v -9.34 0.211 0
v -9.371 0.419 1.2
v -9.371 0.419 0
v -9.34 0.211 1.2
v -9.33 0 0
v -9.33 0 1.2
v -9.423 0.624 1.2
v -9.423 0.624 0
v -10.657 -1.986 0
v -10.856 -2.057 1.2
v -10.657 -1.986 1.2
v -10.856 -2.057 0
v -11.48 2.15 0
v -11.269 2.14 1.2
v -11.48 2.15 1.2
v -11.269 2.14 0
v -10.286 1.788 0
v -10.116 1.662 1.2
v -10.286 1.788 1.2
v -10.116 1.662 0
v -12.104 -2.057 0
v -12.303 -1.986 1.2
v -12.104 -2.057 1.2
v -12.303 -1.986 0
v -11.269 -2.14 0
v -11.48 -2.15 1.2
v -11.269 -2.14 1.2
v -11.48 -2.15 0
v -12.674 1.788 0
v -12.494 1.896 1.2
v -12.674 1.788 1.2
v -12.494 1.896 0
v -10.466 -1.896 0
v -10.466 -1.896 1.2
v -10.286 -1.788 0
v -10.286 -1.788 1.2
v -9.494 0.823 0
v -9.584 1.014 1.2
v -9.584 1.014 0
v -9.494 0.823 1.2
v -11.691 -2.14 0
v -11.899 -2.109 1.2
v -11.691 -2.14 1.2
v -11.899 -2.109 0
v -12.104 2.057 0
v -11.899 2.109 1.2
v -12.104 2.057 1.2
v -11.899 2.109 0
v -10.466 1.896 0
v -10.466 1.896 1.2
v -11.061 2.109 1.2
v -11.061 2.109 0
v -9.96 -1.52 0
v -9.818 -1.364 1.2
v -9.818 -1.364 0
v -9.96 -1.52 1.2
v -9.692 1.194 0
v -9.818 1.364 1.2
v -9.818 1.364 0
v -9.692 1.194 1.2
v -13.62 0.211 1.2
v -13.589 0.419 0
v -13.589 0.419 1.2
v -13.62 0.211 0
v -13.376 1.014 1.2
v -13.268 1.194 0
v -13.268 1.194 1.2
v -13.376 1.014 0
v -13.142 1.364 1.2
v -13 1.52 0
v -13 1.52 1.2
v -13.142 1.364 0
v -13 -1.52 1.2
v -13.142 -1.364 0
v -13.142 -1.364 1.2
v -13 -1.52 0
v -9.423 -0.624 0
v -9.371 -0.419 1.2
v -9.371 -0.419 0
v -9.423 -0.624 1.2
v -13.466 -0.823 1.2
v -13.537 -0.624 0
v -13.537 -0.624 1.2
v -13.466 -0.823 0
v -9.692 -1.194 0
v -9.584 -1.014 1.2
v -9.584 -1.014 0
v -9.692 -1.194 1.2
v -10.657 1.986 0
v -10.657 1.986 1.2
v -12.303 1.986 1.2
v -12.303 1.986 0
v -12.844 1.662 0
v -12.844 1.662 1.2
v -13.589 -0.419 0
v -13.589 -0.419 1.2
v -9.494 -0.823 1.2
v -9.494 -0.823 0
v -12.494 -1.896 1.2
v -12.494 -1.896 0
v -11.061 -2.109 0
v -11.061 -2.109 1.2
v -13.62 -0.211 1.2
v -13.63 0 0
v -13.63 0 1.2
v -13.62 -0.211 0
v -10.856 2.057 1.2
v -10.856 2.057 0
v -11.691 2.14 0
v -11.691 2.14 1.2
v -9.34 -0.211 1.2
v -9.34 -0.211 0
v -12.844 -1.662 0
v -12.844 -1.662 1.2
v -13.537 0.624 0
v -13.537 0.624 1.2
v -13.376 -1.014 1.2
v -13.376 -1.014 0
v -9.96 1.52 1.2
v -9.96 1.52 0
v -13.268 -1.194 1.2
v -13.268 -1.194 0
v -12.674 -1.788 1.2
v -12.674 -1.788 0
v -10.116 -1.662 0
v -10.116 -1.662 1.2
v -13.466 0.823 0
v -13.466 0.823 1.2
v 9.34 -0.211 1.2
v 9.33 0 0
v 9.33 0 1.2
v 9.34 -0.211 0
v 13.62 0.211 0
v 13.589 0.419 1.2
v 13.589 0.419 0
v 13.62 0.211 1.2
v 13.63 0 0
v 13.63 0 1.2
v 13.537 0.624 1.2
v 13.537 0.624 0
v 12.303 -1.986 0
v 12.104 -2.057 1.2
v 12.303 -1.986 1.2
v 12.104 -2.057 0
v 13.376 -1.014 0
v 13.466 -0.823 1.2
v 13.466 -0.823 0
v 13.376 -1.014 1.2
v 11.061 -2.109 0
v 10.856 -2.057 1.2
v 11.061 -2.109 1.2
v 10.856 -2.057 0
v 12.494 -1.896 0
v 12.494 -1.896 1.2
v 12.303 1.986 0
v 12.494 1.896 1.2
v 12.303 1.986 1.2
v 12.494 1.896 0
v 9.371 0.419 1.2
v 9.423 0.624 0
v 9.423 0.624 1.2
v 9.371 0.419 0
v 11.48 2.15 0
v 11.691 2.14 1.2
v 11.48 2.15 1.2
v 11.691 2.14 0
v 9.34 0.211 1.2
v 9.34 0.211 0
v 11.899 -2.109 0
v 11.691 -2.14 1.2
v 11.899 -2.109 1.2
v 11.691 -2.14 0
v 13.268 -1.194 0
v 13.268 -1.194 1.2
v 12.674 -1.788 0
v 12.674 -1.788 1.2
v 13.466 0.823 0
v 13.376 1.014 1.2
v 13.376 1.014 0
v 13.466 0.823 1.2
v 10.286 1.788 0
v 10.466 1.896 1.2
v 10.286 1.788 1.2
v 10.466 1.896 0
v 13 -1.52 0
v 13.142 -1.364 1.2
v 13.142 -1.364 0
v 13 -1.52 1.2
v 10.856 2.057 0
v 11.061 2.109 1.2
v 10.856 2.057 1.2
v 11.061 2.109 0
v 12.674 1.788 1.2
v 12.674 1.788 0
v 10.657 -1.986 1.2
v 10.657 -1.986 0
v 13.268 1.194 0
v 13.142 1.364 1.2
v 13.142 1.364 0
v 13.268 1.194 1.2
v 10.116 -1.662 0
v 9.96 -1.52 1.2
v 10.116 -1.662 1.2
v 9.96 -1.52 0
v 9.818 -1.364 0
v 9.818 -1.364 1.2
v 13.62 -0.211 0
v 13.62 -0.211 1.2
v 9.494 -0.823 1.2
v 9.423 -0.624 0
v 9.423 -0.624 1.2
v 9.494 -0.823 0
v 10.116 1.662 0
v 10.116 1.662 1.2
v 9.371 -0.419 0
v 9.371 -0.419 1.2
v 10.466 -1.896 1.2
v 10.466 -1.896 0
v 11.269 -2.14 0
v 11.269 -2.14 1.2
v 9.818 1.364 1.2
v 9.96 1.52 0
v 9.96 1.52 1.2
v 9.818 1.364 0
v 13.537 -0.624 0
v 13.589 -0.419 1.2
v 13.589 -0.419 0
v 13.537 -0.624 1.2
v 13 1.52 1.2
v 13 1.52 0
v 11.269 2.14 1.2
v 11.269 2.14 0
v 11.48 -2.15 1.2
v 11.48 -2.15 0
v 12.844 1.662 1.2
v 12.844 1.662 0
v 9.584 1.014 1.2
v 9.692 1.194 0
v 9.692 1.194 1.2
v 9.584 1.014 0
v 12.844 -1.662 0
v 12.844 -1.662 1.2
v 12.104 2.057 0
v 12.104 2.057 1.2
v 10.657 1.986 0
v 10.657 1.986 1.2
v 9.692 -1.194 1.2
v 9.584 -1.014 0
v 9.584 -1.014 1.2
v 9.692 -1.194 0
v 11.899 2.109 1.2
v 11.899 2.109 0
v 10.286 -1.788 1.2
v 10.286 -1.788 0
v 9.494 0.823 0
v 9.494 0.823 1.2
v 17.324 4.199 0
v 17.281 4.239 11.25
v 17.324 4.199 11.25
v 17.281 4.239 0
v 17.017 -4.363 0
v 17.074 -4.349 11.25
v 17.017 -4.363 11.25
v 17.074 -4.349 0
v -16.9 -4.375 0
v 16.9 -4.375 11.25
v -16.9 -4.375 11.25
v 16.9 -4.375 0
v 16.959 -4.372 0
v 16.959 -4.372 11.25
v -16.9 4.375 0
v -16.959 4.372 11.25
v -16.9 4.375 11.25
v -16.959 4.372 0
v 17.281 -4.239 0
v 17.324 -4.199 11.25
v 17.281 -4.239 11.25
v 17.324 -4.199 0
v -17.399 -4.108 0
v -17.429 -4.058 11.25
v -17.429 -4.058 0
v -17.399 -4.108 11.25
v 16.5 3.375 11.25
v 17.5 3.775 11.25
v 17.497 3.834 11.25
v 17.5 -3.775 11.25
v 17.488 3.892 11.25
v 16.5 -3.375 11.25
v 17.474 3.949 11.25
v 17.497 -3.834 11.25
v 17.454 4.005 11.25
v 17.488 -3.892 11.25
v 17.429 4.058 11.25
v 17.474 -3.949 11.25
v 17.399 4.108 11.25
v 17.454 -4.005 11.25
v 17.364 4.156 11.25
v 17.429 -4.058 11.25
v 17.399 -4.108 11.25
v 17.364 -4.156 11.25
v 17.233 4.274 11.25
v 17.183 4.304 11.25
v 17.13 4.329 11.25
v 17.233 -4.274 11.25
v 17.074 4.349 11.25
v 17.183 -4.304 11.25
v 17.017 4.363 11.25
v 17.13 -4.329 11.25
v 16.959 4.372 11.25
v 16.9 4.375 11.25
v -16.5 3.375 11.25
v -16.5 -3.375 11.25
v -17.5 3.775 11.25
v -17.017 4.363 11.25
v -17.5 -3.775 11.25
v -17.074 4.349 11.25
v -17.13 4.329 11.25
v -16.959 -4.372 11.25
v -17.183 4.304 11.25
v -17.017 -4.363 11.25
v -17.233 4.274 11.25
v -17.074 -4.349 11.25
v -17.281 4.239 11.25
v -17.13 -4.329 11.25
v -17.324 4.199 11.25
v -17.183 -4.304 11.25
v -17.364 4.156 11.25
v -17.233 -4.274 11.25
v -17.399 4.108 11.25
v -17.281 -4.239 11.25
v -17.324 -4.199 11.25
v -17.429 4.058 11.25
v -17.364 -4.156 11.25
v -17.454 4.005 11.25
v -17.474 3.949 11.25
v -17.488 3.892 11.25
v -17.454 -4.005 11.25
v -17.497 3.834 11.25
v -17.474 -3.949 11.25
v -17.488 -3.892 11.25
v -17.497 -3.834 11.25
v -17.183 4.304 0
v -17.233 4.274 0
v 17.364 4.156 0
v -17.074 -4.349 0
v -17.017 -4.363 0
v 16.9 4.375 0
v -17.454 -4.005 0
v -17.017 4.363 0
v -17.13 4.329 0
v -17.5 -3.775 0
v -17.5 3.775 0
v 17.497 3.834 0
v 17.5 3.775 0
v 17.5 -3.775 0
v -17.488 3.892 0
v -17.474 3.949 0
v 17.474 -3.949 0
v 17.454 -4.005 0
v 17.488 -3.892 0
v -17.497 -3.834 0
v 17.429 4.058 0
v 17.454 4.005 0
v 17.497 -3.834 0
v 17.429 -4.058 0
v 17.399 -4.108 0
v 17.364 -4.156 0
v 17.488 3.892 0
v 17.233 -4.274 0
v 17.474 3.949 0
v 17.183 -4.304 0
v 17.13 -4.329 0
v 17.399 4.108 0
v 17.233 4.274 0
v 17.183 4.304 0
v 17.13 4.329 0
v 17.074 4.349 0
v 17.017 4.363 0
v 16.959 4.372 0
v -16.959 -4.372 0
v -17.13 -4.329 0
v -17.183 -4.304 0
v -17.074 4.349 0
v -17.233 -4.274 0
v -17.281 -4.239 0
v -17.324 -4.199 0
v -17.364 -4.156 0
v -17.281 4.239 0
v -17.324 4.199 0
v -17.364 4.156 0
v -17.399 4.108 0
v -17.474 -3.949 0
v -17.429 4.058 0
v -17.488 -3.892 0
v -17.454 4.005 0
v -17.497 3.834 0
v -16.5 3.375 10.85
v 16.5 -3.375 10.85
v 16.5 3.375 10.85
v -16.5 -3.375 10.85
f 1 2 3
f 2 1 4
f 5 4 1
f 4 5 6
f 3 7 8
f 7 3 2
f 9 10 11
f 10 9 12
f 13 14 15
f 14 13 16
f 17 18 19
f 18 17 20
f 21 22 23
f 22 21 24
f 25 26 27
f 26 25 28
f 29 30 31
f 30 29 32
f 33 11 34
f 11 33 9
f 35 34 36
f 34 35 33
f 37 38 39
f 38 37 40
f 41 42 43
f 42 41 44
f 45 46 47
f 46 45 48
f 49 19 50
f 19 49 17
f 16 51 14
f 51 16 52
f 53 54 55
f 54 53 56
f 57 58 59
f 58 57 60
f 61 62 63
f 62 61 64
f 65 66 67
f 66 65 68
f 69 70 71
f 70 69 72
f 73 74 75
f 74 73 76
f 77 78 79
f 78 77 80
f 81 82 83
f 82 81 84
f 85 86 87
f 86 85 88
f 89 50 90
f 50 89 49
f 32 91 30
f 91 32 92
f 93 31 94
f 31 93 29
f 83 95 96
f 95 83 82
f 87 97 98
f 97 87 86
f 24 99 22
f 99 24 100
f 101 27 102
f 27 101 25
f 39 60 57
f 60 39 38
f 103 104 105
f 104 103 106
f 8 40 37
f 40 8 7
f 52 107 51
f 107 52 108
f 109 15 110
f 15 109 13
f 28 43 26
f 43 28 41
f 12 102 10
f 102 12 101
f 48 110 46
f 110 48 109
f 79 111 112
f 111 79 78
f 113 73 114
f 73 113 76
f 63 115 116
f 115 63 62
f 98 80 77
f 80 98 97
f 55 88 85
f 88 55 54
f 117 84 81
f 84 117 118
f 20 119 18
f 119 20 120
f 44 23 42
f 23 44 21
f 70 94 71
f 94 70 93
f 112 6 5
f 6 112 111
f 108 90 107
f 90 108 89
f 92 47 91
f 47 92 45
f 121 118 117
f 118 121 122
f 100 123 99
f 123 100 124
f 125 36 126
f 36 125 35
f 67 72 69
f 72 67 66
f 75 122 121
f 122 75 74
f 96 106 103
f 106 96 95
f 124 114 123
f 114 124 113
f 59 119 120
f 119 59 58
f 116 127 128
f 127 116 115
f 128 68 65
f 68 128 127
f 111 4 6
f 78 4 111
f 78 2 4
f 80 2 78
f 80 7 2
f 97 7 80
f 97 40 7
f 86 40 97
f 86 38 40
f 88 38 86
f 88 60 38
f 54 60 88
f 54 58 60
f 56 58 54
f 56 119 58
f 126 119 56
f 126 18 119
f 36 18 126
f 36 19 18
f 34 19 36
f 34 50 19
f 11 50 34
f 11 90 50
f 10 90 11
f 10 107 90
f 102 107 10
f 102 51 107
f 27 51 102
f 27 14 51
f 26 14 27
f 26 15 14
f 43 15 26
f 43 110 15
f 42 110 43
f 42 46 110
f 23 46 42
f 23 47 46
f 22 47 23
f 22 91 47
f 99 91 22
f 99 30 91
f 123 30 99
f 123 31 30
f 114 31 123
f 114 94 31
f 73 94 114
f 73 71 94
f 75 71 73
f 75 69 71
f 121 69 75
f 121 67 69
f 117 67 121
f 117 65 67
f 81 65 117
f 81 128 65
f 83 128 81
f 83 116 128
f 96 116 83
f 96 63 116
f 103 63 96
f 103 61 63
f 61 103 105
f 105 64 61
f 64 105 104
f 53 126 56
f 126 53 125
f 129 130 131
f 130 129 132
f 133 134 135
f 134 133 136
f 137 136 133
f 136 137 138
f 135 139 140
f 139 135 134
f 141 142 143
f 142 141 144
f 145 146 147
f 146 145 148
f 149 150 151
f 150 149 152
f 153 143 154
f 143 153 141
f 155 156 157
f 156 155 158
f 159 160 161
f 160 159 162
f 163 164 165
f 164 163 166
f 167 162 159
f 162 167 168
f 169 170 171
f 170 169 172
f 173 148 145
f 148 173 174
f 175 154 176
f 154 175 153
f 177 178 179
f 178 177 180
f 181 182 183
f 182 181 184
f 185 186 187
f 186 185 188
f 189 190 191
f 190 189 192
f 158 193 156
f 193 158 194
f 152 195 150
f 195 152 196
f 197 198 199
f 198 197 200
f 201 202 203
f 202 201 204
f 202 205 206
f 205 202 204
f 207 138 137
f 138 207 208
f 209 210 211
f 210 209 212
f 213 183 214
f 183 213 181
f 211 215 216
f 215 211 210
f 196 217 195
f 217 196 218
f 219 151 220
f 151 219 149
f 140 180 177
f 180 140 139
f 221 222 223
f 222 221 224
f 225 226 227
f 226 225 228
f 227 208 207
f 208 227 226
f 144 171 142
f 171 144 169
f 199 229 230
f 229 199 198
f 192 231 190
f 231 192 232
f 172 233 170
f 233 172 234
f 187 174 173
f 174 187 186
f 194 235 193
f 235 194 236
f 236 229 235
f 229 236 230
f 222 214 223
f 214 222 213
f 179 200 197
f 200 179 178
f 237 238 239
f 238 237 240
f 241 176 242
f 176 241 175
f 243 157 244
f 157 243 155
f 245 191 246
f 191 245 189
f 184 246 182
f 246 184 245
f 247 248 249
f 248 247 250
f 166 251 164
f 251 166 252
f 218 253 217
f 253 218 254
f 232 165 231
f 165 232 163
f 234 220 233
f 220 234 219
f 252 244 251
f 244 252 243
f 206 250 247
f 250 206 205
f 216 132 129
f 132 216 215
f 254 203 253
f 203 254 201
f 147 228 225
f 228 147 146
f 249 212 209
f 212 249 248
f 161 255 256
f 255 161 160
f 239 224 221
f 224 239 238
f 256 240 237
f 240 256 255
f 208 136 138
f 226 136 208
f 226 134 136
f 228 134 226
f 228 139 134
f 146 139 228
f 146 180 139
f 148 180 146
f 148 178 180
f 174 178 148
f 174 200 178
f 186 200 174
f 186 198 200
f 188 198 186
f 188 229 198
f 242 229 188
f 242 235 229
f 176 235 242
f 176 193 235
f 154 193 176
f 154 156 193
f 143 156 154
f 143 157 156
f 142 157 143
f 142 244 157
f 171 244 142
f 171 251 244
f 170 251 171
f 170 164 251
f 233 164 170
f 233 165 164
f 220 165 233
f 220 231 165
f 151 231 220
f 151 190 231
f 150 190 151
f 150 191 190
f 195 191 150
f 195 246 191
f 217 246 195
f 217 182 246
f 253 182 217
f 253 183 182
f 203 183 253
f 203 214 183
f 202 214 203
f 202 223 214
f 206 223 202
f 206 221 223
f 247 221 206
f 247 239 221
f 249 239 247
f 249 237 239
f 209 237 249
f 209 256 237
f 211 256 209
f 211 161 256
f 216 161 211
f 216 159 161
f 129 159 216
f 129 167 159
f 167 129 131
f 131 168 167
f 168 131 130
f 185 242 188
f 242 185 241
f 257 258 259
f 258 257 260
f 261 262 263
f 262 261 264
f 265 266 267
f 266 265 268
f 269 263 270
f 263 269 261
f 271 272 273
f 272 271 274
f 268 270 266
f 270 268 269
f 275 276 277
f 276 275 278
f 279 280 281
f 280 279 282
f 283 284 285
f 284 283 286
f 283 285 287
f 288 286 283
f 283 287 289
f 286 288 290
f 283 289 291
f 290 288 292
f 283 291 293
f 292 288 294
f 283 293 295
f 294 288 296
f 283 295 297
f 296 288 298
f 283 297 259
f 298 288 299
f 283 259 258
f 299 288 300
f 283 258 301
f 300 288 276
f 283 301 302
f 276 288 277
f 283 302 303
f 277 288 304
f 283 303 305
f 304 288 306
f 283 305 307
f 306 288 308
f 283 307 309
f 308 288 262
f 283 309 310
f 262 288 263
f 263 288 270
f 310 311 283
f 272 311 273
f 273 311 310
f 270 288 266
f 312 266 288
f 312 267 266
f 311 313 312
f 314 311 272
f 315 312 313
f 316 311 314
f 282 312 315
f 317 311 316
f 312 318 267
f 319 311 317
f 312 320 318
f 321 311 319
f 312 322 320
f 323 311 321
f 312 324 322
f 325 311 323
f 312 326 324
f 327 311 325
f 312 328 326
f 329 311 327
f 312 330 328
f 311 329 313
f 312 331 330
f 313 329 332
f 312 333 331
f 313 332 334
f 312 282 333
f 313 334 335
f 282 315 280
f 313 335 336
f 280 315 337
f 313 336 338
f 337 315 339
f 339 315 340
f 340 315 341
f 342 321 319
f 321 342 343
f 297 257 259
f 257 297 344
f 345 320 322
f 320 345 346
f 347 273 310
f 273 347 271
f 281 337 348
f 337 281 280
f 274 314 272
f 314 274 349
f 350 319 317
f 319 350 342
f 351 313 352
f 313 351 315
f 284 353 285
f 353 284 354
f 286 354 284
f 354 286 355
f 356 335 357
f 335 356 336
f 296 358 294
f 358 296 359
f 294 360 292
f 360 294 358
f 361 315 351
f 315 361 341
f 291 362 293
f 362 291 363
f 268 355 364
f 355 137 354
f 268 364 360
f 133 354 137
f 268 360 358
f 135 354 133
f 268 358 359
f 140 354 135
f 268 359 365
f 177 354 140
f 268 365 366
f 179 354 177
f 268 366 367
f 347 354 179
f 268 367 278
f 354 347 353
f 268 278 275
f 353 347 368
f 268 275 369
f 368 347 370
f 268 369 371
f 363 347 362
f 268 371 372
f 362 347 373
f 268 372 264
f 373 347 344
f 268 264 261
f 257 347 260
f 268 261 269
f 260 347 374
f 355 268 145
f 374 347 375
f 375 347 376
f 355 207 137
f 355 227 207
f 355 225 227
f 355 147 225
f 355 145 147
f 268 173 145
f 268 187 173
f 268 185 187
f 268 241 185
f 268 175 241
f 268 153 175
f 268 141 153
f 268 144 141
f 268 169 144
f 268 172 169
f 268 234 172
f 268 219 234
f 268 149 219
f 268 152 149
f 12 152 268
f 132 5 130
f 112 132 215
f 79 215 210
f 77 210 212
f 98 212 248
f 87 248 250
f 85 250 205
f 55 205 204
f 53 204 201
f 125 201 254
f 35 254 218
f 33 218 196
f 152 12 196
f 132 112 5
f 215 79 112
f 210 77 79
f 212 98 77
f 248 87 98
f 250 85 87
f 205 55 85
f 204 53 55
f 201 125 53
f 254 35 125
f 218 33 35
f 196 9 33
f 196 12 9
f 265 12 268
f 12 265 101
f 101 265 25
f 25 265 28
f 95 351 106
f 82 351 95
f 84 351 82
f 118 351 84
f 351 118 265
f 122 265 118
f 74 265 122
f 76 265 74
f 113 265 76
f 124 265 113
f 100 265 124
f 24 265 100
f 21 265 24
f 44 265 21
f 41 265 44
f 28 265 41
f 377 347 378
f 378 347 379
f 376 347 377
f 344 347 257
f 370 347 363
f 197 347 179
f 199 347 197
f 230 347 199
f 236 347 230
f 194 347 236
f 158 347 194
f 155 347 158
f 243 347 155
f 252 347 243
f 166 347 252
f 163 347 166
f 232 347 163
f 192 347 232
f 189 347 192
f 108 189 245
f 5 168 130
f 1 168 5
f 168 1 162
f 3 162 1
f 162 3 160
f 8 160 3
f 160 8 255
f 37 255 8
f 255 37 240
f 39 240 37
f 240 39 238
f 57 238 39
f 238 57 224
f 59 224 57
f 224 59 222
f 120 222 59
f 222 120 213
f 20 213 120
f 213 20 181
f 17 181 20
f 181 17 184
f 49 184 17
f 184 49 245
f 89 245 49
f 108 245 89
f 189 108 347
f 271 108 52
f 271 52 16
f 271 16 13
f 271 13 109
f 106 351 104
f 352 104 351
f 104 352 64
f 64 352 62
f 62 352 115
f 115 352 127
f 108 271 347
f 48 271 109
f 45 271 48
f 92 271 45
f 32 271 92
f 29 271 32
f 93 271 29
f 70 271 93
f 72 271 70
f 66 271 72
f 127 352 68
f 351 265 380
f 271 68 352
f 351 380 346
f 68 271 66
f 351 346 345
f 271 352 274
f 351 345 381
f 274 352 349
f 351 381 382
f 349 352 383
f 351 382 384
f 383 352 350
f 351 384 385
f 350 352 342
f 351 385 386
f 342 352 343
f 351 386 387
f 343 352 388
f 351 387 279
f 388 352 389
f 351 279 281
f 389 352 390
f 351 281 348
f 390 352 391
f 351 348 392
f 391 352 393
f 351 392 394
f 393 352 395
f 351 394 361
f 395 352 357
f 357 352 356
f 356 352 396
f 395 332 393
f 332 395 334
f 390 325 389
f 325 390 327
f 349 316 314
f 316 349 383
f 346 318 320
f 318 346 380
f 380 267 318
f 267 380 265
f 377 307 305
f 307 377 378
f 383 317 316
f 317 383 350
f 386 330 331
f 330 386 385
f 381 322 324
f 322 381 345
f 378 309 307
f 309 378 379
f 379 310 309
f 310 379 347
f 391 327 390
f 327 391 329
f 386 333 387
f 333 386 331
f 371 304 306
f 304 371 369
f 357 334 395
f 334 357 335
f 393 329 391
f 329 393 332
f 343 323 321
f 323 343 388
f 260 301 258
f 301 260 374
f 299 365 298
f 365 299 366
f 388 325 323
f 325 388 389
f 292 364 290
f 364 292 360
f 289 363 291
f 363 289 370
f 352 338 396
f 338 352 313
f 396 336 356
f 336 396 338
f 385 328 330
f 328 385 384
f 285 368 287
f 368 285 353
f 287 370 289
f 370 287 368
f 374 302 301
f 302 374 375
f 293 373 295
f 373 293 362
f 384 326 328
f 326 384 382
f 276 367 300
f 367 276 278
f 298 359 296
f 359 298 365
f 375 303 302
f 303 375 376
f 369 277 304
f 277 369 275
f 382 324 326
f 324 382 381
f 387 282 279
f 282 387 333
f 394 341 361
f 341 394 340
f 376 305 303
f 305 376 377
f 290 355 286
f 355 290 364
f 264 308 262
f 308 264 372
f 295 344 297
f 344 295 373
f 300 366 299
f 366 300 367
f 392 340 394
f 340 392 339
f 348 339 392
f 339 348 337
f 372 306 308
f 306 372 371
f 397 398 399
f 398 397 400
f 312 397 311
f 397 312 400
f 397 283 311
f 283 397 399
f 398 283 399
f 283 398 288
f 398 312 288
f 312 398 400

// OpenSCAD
// diningroom / bench — a backless dining bench token: a plain low slab with an
// optional shallow seat-pad groove on top, or a raised cushion instead.
//
// Width/Depth are the real-world footprint in cm: a bench pulled up to a dining
// table, seat-depth only (no back). Height is the real seat height — a dining bench
// sits at chair-seat height — shrunk by the plan scale like the footprint (see
// printed_h() in lib/common.scad), so it comes out one of the lowest pieces of the
// set.

include <../lib/common.scad>

Width  = 140;  // cm
Depth  = 35;   // cm
Height = 45;   // cm — seat height, as a dining chair

// the printed height, mm: Height at the plan scale
Print_h = printed_h(Height);

// A shallow groove set in from the edge, hinting at the seat pad. Simple by
// design: a bench is a plain slab, this just marks where you would sit.
Show_groove  = true;
Groove_inset = 4;  // cm, wall left between the groove and the edge

// A raised seat cushion instead of a flat pad — off by default (a bench reads
// fine as a plain slab); flip it on for an upholstered bench. See cushion() in
// lib/common.scad — it self-tapers, so it prints without support.
Show_cushion  = false;
Cushion_inset = 3;  // cm, wall left between the cushion and the edge

// Magnet pockets in the bottom face, in a row along the width (0 = none). Two
// keep the piece from pivoting on the board; see Magnet_* in lib/common.scad.
// The 35 cm depth is 8.75 mm across at 1:40 — wide enough for a 4 mm
// disc.
Magnets = 2;

bench();

module bench() {
    union() {
        difference() {
            footprint(Width, Depth, Print_h);
            if (Show_groove)
                groove(0, 0, Width - 2 * Groove_inset, Depth - 2 * Groove_inset,
                       Print_h);
            if (Magnets > 0)
                magnets(Width, Depth, Magnets);
        }
        if (Show_cushion)
            cushion(Width - 2 * Cushion_inset, Depth - 2 * Cushion_inset, Print_h);
    }
}
